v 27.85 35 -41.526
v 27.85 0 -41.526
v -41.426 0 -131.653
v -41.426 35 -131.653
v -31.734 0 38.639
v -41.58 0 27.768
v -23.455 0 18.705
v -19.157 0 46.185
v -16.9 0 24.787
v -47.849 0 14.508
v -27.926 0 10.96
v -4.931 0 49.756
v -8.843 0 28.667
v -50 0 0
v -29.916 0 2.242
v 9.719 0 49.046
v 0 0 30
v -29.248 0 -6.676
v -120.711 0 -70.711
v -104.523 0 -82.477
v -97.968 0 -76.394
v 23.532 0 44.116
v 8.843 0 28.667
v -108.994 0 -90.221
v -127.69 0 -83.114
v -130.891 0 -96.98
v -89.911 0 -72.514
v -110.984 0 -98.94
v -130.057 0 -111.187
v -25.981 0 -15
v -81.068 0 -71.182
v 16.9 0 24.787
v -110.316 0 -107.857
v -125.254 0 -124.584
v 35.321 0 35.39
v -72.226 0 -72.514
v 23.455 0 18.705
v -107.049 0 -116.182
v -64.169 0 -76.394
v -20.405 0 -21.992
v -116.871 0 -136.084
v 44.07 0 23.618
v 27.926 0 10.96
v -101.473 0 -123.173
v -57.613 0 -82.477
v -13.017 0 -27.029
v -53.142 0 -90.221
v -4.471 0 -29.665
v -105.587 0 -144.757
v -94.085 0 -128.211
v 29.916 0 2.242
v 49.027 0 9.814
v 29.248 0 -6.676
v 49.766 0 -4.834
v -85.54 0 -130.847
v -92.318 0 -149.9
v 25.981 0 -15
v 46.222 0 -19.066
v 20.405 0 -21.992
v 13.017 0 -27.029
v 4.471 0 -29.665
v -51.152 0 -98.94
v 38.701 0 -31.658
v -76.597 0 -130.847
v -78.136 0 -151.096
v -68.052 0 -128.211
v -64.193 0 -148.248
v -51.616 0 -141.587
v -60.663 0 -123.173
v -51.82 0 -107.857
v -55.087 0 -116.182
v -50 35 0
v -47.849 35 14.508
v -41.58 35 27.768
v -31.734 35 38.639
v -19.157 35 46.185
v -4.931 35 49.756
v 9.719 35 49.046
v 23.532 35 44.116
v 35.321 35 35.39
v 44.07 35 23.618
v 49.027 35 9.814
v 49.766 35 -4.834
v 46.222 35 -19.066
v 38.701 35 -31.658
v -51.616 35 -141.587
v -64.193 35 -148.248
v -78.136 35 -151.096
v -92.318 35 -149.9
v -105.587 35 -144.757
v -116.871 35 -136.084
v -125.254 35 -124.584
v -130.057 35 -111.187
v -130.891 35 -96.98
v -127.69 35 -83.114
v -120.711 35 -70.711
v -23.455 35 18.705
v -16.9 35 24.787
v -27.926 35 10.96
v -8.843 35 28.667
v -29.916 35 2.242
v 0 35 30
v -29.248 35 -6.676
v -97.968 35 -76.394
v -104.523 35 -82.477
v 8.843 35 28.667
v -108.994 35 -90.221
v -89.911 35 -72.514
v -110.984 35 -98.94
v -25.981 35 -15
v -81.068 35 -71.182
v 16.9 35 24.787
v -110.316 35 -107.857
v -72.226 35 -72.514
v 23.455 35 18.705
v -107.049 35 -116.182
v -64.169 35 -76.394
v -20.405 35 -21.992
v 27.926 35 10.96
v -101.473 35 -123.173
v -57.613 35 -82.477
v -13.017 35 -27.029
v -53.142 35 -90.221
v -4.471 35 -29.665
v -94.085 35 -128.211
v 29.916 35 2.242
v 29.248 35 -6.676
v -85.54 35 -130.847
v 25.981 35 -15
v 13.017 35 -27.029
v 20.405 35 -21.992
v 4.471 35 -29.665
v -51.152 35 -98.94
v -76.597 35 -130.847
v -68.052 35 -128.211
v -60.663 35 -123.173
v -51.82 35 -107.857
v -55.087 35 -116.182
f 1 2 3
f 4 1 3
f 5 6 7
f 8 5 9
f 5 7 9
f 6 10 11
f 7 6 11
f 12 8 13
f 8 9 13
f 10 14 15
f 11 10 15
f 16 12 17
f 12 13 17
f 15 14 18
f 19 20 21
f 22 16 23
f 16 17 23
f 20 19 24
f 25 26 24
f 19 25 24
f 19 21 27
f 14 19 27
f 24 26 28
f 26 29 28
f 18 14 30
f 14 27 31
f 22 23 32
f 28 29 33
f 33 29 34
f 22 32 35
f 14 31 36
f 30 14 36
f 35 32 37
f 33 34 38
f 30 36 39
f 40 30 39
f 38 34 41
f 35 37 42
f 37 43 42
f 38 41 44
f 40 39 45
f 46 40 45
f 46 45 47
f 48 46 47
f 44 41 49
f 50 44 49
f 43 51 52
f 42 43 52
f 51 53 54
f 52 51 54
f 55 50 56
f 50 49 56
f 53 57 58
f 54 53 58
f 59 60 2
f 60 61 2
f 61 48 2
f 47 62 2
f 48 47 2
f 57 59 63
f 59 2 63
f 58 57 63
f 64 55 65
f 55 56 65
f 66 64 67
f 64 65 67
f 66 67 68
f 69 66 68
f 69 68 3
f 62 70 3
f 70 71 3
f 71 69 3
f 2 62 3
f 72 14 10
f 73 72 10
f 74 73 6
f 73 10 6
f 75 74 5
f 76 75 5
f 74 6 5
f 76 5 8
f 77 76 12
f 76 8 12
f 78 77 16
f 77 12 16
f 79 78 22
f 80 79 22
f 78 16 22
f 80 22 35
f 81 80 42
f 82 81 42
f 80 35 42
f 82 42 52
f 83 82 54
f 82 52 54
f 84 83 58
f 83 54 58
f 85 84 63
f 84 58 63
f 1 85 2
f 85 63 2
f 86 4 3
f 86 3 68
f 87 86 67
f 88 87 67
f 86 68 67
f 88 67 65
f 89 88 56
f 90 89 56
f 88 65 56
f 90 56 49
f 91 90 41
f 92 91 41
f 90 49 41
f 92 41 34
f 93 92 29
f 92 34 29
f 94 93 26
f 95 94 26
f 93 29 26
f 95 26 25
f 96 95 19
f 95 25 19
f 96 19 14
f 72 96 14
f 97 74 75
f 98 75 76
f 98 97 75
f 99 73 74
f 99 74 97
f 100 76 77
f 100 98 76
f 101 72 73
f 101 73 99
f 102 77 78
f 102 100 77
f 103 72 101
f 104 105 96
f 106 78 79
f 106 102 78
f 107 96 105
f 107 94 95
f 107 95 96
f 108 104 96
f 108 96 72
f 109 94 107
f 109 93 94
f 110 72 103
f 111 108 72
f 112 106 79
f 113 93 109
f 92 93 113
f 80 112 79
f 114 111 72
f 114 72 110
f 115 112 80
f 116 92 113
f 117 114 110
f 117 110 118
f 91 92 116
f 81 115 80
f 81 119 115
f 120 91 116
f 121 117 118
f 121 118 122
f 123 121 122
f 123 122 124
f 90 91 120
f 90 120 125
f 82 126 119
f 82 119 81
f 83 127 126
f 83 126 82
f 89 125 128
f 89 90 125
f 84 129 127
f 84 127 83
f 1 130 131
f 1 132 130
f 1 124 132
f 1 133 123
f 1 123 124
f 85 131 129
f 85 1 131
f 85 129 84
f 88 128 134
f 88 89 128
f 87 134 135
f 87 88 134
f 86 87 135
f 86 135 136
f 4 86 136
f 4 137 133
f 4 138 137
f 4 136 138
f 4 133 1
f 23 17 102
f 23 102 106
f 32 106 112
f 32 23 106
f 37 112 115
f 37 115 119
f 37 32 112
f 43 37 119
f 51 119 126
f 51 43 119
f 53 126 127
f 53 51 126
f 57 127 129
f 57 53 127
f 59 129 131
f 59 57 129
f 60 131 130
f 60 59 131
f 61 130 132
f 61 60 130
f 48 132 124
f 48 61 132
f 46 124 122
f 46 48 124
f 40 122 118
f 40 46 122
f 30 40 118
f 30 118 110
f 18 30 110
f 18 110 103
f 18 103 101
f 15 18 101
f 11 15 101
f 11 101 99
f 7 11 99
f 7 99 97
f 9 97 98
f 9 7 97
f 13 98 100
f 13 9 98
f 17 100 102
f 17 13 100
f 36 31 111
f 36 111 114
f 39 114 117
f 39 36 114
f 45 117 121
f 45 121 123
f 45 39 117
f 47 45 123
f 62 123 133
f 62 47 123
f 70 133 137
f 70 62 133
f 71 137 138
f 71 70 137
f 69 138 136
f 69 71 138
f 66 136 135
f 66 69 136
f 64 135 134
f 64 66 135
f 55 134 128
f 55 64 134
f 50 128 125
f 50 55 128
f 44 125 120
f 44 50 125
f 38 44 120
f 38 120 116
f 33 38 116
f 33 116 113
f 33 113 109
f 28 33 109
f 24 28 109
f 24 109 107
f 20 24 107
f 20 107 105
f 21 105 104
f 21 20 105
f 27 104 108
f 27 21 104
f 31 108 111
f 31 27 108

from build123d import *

# Parameters (mm, degrees)
SKETCH1_R           = 30
BOSS_EXTRUDE1_DEPTH = 35


with BuildPart() as part:
    # Sketch1 → Boss-Extrude1 (new body)
    with BuildSketch(Plane(origin=(0, 0, 0), x_dir=(1, 0, 0), z_dir=(0, 1, 0))):
        with BuildLine():
            Line((-111.539207578, 61.539207578), (-50, 0))
            ThreePointArc((-50, 0), (23.532123251, -44.116200826), (27.849567012, 41.525915008))
            Line((27.849567012, 41.525915008), (-41.425841319, 131.652573837))
            ThreePointArc((-41.425841319, 131.652573837), (-111.539207578, 140.824044377), (-120.710678119, 70.710678119))
            Line((-120.710678119, 70.710678119), (-111.539207578, 61.539207578))
        make_face()
        with Locations(Location((0, 0, 0), (0, 0, 270))):
            Circle(SKETCH1_R, mode=Mode.SUBTRACT)
        with Locations(Location((-81.068259719, 101.181625978, 0), (0, 0, 270))):
            Circle(SKETCH1_R, mode=Mode.SUBTRACT)
    extrude(amount=BOSS_EXTRUDE1_DEPTH)


solid = part.part
